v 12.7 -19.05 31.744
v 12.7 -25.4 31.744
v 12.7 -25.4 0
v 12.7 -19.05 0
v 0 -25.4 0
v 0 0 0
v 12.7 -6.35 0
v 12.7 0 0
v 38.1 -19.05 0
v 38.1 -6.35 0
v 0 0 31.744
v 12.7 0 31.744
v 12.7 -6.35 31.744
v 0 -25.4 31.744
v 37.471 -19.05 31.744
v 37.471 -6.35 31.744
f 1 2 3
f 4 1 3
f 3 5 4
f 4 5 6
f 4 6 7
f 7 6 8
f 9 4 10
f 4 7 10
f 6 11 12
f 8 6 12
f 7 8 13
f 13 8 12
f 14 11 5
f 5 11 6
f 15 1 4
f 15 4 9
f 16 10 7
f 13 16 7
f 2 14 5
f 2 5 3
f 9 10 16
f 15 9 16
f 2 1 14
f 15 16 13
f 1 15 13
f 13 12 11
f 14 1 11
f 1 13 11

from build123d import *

# Parameters (mm, degrees)
F1_DEPTH = 25.4
F3_DEPTH = 6.35
F5_DEPTH = 6.35


with BuildPart() as f1:
    # F0 (on Front) → F1 (new body)
    with BuildSketch(Plane.XZ):
        Polygon((37.471404, 31.743777), (0, 31.743777), (0, 0), (38.1, 0), align=None)
    extrude(amount=F1_DEPTH)

    # F2 (on face) → F3 (cut)
    with BuildSketch(Plane.XZ.offset(25.4)):
        Polygon((37.471404, 31.743777), (12.7, 31.743777), (12.7, 0), (38.1, 0), align=None)
    extrude(amount=-F3_DEPTH, mode=Mode.SUBTRACT)

    # F4 (on face) → F5 (cut)
    with BuildSketch(Plane(origin=(0, 0, 0), x_dir=(-1, 0, 0), z_dir=(0, 1, 0))):
        Polygon((-38.1, 0), (-12.7, 0), (-12.7, 8.530987), (-12.7, 31.743777), (-37.471404, 31.743777), align=None)
    extrude(amount=-F5_DEPTH, mode=Mode.SUBTRACT)


solid = f1.part
